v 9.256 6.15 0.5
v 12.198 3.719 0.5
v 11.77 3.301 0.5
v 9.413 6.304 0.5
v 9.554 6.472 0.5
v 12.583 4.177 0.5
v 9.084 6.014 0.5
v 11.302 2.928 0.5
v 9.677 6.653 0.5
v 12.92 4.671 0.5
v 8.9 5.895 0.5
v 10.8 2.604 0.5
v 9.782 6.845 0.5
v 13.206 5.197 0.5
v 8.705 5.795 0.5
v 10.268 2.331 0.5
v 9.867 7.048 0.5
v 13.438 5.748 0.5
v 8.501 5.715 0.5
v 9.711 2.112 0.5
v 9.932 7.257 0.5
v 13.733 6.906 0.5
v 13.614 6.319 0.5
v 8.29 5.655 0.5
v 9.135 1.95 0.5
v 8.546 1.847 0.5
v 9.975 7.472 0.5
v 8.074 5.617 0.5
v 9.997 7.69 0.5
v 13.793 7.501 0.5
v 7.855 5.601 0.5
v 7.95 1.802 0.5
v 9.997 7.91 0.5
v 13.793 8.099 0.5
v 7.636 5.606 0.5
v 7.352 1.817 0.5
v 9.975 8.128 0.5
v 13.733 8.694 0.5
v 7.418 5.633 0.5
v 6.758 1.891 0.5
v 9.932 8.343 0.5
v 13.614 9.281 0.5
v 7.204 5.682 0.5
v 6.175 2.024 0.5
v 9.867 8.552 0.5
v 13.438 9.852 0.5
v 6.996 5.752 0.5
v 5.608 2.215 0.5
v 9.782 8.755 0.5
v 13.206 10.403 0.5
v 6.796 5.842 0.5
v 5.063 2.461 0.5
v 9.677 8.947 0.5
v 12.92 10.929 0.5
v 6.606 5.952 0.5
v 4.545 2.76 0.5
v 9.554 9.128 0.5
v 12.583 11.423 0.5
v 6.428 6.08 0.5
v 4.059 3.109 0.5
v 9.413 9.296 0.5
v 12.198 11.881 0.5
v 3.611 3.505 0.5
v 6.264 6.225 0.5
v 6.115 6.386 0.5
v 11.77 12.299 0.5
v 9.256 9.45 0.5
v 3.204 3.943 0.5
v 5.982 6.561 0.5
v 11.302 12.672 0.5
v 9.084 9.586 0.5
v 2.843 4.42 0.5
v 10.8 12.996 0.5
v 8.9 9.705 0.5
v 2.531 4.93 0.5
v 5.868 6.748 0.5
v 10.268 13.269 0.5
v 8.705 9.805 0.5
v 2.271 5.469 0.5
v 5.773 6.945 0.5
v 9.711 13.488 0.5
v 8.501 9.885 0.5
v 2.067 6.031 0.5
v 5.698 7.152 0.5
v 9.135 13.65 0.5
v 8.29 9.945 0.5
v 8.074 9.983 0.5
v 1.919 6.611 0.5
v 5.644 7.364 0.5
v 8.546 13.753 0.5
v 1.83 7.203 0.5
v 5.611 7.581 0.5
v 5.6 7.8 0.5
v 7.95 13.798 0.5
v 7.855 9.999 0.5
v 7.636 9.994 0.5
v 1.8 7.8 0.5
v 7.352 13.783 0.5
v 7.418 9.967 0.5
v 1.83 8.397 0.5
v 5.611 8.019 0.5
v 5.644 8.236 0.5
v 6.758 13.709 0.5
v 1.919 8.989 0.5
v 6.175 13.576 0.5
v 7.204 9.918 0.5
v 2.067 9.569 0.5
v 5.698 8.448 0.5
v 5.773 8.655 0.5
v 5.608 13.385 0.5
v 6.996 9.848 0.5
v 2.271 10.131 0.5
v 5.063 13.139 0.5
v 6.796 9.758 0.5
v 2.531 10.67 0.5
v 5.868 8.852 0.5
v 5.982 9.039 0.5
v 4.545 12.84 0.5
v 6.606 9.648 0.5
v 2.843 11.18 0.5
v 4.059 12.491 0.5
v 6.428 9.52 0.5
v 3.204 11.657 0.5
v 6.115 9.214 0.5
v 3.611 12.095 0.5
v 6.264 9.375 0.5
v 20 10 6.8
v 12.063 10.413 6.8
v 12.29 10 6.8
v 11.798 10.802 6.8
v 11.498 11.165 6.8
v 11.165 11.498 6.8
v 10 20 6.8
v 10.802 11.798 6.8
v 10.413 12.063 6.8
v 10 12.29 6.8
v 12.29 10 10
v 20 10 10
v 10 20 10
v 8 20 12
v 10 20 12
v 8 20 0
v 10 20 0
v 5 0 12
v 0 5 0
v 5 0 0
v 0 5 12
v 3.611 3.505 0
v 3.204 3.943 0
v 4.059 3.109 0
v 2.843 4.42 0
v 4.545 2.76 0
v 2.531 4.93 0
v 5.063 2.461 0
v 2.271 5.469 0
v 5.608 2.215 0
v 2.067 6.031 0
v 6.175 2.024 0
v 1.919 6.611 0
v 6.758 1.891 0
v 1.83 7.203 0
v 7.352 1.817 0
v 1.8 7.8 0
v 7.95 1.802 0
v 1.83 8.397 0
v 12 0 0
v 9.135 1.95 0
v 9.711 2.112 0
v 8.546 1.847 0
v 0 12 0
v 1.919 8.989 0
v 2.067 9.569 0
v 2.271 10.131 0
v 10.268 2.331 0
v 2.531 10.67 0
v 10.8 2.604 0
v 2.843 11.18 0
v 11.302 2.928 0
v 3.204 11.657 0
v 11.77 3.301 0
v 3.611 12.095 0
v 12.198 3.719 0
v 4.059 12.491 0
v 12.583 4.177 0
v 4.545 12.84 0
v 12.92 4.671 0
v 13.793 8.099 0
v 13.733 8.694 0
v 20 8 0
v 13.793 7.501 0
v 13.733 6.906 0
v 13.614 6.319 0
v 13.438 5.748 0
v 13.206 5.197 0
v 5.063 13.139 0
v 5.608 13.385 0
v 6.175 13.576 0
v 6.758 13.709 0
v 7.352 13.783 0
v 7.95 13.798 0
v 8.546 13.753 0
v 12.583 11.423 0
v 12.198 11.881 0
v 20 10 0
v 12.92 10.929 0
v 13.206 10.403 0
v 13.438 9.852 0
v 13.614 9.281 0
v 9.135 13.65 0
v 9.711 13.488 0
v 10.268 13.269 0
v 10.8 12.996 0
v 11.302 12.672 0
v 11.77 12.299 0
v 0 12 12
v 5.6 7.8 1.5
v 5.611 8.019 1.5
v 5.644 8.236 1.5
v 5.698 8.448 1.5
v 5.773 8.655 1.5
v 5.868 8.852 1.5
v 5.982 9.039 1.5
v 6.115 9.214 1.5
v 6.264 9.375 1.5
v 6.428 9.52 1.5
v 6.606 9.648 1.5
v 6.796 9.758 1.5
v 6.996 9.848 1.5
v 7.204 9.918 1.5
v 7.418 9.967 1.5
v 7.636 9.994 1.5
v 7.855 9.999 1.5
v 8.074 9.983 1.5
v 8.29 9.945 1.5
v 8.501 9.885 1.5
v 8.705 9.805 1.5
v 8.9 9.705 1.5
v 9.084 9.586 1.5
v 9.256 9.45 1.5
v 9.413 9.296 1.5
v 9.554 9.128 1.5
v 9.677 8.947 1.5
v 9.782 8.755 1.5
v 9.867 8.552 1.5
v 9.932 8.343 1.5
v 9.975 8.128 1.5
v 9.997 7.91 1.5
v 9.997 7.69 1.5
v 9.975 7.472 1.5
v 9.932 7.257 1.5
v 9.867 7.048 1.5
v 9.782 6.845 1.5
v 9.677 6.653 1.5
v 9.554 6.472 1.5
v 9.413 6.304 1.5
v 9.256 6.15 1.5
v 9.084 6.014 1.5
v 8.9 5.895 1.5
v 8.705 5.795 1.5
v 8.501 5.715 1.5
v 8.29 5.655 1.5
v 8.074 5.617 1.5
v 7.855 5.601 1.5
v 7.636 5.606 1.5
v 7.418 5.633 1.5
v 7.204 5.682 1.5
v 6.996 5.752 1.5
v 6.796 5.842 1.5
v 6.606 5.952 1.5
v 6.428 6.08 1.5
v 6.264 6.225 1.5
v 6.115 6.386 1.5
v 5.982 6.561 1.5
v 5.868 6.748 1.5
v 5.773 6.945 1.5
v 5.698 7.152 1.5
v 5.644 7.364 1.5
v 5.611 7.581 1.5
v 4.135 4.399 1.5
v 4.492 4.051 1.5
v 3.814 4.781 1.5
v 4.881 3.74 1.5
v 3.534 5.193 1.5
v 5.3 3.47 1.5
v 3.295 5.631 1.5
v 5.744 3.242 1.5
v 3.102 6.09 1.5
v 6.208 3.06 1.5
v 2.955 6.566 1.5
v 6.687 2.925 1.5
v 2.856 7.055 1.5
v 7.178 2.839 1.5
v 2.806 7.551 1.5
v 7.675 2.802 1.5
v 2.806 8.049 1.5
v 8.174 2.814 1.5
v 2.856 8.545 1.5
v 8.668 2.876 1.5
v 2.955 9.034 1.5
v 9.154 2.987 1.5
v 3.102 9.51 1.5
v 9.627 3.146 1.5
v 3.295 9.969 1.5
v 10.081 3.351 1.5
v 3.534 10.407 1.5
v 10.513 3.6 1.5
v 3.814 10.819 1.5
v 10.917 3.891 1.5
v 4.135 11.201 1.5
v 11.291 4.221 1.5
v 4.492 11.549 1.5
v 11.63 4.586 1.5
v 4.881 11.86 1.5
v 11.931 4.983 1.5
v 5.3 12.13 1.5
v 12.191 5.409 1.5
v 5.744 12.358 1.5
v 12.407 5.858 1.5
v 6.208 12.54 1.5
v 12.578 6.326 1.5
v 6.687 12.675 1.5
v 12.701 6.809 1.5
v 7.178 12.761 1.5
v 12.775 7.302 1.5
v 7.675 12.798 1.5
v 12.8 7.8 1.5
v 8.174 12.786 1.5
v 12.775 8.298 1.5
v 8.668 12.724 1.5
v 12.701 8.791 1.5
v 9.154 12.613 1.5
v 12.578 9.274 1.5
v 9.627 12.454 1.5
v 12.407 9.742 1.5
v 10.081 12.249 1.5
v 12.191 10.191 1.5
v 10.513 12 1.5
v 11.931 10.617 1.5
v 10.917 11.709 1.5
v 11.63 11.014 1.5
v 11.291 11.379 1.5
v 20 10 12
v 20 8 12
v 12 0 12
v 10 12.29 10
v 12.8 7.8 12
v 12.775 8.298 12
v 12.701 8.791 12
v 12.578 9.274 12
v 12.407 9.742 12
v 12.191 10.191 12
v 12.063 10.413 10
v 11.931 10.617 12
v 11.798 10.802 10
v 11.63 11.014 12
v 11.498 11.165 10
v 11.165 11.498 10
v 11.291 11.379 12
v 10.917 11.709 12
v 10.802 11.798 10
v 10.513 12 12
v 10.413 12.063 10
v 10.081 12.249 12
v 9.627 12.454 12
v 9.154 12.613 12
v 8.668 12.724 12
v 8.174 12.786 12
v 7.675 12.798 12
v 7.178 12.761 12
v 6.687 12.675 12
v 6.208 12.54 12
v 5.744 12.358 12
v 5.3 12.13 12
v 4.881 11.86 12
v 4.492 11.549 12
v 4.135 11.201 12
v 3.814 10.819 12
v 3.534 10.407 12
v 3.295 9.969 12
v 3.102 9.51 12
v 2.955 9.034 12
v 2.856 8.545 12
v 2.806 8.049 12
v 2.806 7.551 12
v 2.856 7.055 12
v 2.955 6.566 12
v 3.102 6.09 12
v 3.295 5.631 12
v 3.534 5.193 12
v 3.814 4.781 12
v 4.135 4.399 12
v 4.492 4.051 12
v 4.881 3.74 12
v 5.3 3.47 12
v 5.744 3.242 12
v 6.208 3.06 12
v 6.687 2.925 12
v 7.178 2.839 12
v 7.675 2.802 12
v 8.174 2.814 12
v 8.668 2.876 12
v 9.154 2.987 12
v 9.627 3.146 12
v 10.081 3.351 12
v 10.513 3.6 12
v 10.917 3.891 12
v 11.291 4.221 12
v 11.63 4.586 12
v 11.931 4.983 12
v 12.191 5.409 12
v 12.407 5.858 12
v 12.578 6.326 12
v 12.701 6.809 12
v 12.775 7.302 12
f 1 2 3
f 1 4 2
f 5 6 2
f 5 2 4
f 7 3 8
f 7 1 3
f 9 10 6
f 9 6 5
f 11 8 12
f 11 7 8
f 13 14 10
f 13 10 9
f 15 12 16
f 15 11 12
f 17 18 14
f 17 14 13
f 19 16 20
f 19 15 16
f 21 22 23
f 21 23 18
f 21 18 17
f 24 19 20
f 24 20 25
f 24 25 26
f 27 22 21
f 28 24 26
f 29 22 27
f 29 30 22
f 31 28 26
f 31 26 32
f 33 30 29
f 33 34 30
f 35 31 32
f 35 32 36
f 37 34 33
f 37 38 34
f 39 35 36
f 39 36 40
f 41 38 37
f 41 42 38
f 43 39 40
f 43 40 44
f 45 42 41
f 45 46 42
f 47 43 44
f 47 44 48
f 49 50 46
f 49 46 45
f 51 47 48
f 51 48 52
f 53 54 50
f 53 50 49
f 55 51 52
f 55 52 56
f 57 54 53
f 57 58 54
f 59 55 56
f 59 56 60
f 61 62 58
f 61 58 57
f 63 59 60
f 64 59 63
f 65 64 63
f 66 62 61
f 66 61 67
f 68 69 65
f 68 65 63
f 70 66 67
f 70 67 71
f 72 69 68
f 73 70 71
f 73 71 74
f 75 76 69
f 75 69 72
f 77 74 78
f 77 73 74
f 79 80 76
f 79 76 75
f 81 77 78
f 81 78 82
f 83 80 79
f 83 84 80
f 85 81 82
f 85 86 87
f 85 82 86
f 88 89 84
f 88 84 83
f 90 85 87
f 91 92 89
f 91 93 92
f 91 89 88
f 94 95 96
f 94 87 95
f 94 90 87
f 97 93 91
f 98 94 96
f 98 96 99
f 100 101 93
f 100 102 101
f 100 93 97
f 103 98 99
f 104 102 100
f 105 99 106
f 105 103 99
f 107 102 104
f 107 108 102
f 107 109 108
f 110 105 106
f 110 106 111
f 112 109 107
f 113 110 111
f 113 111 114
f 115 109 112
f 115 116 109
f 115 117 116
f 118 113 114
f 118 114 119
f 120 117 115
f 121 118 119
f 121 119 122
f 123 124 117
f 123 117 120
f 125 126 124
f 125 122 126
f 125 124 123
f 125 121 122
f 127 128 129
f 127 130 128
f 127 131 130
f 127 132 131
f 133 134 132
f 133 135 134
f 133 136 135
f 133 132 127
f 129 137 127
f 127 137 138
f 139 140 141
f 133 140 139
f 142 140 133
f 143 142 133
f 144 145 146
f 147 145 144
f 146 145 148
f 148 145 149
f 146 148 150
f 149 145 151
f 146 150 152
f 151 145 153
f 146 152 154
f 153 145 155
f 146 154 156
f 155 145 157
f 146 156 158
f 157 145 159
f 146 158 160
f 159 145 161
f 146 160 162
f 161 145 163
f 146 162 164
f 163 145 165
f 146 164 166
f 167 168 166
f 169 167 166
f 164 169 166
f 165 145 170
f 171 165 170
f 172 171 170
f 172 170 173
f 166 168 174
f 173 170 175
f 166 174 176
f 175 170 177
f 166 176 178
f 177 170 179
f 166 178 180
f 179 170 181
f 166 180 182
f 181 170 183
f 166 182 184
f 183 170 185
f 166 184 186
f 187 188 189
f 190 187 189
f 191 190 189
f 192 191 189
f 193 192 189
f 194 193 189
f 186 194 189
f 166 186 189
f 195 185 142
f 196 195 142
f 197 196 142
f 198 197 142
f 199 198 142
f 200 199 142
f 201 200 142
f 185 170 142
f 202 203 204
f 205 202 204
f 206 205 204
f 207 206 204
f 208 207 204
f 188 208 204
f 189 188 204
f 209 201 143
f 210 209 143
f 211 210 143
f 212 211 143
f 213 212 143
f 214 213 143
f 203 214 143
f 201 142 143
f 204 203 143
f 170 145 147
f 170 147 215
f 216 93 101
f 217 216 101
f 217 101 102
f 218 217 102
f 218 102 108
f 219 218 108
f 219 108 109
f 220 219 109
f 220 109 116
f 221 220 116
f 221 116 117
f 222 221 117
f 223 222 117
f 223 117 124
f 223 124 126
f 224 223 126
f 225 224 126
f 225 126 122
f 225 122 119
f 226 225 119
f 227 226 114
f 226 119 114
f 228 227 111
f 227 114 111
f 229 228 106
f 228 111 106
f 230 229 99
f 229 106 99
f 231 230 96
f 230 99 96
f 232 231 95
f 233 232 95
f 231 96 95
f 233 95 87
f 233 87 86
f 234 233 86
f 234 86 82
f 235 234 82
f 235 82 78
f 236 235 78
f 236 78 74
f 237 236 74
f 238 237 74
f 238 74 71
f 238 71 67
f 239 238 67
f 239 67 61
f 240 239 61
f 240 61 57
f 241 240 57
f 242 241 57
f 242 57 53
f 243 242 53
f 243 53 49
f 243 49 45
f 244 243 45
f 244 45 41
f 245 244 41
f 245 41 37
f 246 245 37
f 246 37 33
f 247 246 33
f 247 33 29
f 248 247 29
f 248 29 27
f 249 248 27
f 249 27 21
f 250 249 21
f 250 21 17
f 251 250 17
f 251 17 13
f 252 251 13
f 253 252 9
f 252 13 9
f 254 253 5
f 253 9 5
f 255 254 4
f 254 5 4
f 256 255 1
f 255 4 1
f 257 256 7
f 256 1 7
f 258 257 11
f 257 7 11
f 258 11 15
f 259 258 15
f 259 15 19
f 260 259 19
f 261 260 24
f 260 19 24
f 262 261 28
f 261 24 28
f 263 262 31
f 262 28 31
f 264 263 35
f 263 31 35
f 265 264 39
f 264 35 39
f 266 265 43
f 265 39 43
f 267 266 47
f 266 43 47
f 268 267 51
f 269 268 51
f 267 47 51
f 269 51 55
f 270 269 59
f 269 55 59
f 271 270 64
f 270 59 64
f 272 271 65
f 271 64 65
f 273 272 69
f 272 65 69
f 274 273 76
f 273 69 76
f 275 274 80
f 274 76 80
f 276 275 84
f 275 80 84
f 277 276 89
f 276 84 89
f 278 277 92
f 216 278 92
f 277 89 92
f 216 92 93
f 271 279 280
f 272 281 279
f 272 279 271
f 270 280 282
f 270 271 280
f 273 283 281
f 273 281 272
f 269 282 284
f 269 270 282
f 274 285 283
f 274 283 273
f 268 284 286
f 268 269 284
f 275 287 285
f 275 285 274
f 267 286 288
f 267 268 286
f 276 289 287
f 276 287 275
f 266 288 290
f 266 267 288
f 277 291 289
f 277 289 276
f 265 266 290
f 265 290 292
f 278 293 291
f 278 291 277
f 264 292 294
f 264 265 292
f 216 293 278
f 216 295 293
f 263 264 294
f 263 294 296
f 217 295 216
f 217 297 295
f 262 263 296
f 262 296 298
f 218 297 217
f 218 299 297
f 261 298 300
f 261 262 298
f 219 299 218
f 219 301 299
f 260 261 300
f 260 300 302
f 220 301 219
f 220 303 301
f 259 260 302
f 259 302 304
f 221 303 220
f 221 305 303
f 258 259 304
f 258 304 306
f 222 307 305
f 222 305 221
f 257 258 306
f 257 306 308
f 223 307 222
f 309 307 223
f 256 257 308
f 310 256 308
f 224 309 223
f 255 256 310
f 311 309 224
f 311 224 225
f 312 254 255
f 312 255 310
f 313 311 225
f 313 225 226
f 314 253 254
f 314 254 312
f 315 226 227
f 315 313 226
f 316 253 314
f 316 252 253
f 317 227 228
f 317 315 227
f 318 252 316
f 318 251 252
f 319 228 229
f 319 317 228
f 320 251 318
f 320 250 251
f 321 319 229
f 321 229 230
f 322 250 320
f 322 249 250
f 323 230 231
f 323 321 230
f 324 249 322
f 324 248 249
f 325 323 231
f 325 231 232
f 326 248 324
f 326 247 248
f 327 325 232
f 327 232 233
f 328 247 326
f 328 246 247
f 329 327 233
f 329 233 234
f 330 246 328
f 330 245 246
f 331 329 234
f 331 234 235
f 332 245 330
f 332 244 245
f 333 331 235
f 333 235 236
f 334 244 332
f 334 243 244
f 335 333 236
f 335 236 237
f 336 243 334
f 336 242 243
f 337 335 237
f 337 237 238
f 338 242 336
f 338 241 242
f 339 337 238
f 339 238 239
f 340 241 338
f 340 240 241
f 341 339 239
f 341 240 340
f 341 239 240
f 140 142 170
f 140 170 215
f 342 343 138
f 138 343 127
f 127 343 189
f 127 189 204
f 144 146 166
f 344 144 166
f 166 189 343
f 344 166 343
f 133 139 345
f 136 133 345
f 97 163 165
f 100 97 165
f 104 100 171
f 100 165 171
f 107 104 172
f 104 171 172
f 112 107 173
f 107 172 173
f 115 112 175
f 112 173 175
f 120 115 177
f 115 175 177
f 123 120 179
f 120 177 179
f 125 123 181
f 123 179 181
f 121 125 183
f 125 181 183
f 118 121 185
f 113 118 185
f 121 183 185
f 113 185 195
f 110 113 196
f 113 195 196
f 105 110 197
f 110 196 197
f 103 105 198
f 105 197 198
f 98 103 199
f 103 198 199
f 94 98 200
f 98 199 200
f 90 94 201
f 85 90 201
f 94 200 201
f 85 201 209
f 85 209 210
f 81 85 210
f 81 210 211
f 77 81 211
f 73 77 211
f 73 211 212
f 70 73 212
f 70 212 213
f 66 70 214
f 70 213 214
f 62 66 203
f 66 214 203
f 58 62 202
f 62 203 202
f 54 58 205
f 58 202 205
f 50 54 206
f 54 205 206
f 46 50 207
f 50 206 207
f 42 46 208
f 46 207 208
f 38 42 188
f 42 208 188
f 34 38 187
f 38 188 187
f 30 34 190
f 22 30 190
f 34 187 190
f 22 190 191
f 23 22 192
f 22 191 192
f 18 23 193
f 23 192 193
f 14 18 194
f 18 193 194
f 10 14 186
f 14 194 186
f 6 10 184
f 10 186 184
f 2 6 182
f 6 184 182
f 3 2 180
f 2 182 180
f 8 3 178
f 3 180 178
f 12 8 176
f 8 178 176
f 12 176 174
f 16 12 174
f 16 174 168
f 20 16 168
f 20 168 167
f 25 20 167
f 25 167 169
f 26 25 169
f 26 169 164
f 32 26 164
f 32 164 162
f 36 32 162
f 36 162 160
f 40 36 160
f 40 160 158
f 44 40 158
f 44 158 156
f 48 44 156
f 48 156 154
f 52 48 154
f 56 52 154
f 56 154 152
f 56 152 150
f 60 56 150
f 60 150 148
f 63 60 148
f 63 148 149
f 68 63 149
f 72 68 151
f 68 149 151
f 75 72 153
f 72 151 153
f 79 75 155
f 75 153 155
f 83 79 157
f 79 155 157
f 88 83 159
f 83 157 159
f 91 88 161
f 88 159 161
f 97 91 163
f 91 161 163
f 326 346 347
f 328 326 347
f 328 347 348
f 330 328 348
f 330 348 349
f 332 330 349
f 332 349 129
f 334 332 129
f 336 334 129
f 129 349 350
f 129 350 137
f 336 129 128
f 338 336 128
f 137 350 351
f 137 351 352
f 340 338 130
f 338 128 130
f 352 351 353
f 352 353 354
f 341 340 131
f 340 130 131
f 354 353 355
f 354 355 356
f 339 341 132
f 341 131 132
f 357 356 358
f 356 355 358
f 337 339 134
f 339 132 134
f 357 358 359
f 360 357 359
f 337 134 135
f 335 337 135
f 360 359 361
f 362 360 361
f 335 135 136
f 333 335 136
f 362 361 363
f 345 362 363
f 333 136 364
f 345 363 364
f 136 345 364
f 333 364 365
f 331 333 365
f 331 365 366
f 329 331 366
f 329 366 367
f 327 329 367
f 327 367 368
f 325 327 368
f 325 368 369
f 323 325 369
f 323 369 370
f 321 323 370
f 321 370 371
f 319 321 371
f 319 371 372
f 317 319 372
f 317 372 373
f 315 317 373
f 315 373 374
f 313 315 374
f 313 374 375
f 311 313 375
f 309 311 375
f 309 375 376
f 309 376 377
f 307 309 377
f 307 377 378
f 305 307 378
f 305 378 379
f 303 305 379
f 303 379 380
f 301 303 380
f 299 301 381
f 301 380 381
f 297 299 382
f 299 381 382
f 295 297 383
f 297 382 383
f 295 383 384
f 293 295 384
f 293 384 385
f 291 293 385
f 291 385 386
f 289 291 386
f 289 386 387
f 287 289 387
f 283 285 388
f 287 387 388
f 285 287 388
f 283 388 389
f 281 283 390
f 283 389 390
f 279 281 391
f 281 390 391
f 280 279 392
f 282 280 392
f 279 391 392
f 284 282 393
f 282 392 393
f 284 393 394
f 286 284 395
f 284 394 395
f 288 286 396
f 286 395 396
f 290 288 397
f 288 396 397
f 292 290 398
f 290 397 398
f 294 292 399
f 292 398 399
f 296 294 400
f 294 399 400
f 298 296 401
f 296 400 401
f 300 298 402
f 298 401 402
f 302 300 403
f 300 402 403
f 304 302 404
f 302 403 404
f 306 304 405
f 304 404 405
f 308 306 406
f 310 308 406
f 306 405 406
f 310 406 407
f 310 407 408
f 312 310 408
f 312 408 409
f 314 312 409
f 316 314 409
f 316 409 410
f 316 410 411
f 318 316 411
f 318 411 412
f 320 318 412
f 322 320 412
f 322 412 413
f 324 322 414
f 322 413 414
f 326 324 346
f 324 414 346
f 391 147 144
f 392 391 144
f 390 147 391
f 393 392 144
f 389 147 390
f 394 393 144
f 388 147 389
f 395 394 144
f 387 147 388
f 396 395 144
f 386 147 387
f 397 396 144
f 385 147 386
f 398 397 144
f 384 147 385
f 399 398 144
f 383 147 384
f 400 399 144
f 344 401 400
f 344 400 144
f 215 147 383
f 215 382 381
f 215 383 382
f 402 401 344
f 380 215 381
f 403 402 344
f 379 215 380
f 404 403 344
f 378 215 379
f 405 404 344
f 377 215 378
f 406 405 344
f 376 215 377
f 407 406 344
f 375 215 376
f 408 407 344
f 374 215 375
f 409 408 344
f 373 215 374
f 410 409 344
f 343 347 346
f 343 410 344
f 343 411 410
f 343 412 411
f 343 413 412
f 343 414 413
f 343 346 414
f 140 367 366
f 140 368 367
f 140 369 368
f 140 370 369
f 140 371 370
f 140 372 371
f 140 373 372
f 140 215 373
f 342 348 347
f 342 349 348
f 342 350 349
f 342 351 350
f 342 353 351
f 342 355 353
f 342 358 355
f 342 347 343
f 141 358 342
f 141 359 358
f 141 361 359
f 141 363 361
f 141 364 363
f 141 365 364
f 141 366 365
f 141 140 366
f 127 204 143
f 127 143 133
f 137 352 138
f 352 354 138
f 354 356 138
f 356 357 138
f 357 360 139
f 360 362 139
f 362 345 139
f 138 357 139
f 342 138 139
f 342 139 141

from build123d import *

# Parameters (mm, degrees)
ESQUISSE1_W             = 20
ESQUISSE1_H             = 20
BOSS_EXTRU_1_DEPTH      = 12
CHANFREIN1_SIZE         = 10
ENL_V_START             = -2
ENL_V_MAT_EXTRU_1_DEPTH = 3.2
ESQUISSE3_R             = 2.2
ENL_V_MAT_EXTRU_2_DEPTH = 13
ESQUISSE4_R             = 5
ENL_V_MAT_EXTRU_3_DEPTH = 10.5
CHANFREIN2_SIZE         = 5
CHANFREIN3_SIZE         = 8
SKETCH1_R               = 6
CUT_EXTRUDE1_DEPTH      = 0.5


with BuildPart() as part:
    # Esquisse1 → Boss.-Extru.1 (new body)
    with BuildSketch(Plane.XY):
        with Locations((10, 10)):
            Rectangle(ESQUISSE1_W, ESQUISSE1_H)
    extrude(amount=BOSS_EXTRU_1_DEPTH)

    # Chanfrein1
    chanfrein1_edges = [part.edges().sort_by_distance(p)[0] for p in [
        (20, 20, 6),
    ]]
    chamfer(chanfrein1_edges, length=CHANFREIN1_SIZE)

    # Esquisse2 → Enlèv. mat.-Extru.1 (cut)
    with BuildSketch(Plane.XY.offset(12).offset(ENL_V_START)):
        Polygon((10, 20), (10, 10), (20, 10), align=None)
    extrude(amount=-ENL_V_MAT_EXTRU_1_DEPTH, mode=Mode.SUBTRACT)

    # Esquisse3 → Enlèv. mat.-Extru.2 (cut, through all)
    with BuildSketch(Plane(origin=(0, 0, 0), x_dir=(-1, 0, 0), z_dir=(0, 0, -1))):
        with Locations((-7.8, 7.8)):
            Circle(ESQUISSE3_R)
    extrude(amount=-ENL_V_MAT_EXTRU_2_DEPTH, mode=Mode.SUBTRACT)

    # Esquisse4 → Enlèv. mat.-Extru.3 (cut)
    with BuildSketch(Plane.XY.offset(12)):
        with Locations((7.8, 7.8)):
            Circle(ESQUISSE4_R)
    extrude(amount=-ENL_V_MAT_EXTRU_3_DEPTH, mode=Mode.SUBTRACT)

    # Chanfrein2
    chanfrein2_edges = [part.edges().sort_by_distance(p)[0] for p in [
        (0, 0, 6),
    ]]
    chamfer(chanfrein2_edges, length=CHANFREIN2_SIZE)

    # Chanfrein3
    chanfrein3_edges = [part.edges().sort_by_distance(p)[0] for p in [
        (0, 20, 6),
        (20, 0, 6),
    ]]
    chamfer(chanfrein3_edges, length=CHANFREIN3_SIZE)

    # Sketch1 → Cut-Extrude1 (cut)
    with BuildSketch(Plane(origin=(0, 0, 0), x_dir=(-1, 0, 0), z_dir=(0, 0, -1))):
        with Locations((-7.8, 7.8)):
            Circle(SKETCH1_R)
    extrude(amount=-CUT_EXTRUDE1_DEPTH, mode=Mode.SUBTRACT)


solid = part.part
